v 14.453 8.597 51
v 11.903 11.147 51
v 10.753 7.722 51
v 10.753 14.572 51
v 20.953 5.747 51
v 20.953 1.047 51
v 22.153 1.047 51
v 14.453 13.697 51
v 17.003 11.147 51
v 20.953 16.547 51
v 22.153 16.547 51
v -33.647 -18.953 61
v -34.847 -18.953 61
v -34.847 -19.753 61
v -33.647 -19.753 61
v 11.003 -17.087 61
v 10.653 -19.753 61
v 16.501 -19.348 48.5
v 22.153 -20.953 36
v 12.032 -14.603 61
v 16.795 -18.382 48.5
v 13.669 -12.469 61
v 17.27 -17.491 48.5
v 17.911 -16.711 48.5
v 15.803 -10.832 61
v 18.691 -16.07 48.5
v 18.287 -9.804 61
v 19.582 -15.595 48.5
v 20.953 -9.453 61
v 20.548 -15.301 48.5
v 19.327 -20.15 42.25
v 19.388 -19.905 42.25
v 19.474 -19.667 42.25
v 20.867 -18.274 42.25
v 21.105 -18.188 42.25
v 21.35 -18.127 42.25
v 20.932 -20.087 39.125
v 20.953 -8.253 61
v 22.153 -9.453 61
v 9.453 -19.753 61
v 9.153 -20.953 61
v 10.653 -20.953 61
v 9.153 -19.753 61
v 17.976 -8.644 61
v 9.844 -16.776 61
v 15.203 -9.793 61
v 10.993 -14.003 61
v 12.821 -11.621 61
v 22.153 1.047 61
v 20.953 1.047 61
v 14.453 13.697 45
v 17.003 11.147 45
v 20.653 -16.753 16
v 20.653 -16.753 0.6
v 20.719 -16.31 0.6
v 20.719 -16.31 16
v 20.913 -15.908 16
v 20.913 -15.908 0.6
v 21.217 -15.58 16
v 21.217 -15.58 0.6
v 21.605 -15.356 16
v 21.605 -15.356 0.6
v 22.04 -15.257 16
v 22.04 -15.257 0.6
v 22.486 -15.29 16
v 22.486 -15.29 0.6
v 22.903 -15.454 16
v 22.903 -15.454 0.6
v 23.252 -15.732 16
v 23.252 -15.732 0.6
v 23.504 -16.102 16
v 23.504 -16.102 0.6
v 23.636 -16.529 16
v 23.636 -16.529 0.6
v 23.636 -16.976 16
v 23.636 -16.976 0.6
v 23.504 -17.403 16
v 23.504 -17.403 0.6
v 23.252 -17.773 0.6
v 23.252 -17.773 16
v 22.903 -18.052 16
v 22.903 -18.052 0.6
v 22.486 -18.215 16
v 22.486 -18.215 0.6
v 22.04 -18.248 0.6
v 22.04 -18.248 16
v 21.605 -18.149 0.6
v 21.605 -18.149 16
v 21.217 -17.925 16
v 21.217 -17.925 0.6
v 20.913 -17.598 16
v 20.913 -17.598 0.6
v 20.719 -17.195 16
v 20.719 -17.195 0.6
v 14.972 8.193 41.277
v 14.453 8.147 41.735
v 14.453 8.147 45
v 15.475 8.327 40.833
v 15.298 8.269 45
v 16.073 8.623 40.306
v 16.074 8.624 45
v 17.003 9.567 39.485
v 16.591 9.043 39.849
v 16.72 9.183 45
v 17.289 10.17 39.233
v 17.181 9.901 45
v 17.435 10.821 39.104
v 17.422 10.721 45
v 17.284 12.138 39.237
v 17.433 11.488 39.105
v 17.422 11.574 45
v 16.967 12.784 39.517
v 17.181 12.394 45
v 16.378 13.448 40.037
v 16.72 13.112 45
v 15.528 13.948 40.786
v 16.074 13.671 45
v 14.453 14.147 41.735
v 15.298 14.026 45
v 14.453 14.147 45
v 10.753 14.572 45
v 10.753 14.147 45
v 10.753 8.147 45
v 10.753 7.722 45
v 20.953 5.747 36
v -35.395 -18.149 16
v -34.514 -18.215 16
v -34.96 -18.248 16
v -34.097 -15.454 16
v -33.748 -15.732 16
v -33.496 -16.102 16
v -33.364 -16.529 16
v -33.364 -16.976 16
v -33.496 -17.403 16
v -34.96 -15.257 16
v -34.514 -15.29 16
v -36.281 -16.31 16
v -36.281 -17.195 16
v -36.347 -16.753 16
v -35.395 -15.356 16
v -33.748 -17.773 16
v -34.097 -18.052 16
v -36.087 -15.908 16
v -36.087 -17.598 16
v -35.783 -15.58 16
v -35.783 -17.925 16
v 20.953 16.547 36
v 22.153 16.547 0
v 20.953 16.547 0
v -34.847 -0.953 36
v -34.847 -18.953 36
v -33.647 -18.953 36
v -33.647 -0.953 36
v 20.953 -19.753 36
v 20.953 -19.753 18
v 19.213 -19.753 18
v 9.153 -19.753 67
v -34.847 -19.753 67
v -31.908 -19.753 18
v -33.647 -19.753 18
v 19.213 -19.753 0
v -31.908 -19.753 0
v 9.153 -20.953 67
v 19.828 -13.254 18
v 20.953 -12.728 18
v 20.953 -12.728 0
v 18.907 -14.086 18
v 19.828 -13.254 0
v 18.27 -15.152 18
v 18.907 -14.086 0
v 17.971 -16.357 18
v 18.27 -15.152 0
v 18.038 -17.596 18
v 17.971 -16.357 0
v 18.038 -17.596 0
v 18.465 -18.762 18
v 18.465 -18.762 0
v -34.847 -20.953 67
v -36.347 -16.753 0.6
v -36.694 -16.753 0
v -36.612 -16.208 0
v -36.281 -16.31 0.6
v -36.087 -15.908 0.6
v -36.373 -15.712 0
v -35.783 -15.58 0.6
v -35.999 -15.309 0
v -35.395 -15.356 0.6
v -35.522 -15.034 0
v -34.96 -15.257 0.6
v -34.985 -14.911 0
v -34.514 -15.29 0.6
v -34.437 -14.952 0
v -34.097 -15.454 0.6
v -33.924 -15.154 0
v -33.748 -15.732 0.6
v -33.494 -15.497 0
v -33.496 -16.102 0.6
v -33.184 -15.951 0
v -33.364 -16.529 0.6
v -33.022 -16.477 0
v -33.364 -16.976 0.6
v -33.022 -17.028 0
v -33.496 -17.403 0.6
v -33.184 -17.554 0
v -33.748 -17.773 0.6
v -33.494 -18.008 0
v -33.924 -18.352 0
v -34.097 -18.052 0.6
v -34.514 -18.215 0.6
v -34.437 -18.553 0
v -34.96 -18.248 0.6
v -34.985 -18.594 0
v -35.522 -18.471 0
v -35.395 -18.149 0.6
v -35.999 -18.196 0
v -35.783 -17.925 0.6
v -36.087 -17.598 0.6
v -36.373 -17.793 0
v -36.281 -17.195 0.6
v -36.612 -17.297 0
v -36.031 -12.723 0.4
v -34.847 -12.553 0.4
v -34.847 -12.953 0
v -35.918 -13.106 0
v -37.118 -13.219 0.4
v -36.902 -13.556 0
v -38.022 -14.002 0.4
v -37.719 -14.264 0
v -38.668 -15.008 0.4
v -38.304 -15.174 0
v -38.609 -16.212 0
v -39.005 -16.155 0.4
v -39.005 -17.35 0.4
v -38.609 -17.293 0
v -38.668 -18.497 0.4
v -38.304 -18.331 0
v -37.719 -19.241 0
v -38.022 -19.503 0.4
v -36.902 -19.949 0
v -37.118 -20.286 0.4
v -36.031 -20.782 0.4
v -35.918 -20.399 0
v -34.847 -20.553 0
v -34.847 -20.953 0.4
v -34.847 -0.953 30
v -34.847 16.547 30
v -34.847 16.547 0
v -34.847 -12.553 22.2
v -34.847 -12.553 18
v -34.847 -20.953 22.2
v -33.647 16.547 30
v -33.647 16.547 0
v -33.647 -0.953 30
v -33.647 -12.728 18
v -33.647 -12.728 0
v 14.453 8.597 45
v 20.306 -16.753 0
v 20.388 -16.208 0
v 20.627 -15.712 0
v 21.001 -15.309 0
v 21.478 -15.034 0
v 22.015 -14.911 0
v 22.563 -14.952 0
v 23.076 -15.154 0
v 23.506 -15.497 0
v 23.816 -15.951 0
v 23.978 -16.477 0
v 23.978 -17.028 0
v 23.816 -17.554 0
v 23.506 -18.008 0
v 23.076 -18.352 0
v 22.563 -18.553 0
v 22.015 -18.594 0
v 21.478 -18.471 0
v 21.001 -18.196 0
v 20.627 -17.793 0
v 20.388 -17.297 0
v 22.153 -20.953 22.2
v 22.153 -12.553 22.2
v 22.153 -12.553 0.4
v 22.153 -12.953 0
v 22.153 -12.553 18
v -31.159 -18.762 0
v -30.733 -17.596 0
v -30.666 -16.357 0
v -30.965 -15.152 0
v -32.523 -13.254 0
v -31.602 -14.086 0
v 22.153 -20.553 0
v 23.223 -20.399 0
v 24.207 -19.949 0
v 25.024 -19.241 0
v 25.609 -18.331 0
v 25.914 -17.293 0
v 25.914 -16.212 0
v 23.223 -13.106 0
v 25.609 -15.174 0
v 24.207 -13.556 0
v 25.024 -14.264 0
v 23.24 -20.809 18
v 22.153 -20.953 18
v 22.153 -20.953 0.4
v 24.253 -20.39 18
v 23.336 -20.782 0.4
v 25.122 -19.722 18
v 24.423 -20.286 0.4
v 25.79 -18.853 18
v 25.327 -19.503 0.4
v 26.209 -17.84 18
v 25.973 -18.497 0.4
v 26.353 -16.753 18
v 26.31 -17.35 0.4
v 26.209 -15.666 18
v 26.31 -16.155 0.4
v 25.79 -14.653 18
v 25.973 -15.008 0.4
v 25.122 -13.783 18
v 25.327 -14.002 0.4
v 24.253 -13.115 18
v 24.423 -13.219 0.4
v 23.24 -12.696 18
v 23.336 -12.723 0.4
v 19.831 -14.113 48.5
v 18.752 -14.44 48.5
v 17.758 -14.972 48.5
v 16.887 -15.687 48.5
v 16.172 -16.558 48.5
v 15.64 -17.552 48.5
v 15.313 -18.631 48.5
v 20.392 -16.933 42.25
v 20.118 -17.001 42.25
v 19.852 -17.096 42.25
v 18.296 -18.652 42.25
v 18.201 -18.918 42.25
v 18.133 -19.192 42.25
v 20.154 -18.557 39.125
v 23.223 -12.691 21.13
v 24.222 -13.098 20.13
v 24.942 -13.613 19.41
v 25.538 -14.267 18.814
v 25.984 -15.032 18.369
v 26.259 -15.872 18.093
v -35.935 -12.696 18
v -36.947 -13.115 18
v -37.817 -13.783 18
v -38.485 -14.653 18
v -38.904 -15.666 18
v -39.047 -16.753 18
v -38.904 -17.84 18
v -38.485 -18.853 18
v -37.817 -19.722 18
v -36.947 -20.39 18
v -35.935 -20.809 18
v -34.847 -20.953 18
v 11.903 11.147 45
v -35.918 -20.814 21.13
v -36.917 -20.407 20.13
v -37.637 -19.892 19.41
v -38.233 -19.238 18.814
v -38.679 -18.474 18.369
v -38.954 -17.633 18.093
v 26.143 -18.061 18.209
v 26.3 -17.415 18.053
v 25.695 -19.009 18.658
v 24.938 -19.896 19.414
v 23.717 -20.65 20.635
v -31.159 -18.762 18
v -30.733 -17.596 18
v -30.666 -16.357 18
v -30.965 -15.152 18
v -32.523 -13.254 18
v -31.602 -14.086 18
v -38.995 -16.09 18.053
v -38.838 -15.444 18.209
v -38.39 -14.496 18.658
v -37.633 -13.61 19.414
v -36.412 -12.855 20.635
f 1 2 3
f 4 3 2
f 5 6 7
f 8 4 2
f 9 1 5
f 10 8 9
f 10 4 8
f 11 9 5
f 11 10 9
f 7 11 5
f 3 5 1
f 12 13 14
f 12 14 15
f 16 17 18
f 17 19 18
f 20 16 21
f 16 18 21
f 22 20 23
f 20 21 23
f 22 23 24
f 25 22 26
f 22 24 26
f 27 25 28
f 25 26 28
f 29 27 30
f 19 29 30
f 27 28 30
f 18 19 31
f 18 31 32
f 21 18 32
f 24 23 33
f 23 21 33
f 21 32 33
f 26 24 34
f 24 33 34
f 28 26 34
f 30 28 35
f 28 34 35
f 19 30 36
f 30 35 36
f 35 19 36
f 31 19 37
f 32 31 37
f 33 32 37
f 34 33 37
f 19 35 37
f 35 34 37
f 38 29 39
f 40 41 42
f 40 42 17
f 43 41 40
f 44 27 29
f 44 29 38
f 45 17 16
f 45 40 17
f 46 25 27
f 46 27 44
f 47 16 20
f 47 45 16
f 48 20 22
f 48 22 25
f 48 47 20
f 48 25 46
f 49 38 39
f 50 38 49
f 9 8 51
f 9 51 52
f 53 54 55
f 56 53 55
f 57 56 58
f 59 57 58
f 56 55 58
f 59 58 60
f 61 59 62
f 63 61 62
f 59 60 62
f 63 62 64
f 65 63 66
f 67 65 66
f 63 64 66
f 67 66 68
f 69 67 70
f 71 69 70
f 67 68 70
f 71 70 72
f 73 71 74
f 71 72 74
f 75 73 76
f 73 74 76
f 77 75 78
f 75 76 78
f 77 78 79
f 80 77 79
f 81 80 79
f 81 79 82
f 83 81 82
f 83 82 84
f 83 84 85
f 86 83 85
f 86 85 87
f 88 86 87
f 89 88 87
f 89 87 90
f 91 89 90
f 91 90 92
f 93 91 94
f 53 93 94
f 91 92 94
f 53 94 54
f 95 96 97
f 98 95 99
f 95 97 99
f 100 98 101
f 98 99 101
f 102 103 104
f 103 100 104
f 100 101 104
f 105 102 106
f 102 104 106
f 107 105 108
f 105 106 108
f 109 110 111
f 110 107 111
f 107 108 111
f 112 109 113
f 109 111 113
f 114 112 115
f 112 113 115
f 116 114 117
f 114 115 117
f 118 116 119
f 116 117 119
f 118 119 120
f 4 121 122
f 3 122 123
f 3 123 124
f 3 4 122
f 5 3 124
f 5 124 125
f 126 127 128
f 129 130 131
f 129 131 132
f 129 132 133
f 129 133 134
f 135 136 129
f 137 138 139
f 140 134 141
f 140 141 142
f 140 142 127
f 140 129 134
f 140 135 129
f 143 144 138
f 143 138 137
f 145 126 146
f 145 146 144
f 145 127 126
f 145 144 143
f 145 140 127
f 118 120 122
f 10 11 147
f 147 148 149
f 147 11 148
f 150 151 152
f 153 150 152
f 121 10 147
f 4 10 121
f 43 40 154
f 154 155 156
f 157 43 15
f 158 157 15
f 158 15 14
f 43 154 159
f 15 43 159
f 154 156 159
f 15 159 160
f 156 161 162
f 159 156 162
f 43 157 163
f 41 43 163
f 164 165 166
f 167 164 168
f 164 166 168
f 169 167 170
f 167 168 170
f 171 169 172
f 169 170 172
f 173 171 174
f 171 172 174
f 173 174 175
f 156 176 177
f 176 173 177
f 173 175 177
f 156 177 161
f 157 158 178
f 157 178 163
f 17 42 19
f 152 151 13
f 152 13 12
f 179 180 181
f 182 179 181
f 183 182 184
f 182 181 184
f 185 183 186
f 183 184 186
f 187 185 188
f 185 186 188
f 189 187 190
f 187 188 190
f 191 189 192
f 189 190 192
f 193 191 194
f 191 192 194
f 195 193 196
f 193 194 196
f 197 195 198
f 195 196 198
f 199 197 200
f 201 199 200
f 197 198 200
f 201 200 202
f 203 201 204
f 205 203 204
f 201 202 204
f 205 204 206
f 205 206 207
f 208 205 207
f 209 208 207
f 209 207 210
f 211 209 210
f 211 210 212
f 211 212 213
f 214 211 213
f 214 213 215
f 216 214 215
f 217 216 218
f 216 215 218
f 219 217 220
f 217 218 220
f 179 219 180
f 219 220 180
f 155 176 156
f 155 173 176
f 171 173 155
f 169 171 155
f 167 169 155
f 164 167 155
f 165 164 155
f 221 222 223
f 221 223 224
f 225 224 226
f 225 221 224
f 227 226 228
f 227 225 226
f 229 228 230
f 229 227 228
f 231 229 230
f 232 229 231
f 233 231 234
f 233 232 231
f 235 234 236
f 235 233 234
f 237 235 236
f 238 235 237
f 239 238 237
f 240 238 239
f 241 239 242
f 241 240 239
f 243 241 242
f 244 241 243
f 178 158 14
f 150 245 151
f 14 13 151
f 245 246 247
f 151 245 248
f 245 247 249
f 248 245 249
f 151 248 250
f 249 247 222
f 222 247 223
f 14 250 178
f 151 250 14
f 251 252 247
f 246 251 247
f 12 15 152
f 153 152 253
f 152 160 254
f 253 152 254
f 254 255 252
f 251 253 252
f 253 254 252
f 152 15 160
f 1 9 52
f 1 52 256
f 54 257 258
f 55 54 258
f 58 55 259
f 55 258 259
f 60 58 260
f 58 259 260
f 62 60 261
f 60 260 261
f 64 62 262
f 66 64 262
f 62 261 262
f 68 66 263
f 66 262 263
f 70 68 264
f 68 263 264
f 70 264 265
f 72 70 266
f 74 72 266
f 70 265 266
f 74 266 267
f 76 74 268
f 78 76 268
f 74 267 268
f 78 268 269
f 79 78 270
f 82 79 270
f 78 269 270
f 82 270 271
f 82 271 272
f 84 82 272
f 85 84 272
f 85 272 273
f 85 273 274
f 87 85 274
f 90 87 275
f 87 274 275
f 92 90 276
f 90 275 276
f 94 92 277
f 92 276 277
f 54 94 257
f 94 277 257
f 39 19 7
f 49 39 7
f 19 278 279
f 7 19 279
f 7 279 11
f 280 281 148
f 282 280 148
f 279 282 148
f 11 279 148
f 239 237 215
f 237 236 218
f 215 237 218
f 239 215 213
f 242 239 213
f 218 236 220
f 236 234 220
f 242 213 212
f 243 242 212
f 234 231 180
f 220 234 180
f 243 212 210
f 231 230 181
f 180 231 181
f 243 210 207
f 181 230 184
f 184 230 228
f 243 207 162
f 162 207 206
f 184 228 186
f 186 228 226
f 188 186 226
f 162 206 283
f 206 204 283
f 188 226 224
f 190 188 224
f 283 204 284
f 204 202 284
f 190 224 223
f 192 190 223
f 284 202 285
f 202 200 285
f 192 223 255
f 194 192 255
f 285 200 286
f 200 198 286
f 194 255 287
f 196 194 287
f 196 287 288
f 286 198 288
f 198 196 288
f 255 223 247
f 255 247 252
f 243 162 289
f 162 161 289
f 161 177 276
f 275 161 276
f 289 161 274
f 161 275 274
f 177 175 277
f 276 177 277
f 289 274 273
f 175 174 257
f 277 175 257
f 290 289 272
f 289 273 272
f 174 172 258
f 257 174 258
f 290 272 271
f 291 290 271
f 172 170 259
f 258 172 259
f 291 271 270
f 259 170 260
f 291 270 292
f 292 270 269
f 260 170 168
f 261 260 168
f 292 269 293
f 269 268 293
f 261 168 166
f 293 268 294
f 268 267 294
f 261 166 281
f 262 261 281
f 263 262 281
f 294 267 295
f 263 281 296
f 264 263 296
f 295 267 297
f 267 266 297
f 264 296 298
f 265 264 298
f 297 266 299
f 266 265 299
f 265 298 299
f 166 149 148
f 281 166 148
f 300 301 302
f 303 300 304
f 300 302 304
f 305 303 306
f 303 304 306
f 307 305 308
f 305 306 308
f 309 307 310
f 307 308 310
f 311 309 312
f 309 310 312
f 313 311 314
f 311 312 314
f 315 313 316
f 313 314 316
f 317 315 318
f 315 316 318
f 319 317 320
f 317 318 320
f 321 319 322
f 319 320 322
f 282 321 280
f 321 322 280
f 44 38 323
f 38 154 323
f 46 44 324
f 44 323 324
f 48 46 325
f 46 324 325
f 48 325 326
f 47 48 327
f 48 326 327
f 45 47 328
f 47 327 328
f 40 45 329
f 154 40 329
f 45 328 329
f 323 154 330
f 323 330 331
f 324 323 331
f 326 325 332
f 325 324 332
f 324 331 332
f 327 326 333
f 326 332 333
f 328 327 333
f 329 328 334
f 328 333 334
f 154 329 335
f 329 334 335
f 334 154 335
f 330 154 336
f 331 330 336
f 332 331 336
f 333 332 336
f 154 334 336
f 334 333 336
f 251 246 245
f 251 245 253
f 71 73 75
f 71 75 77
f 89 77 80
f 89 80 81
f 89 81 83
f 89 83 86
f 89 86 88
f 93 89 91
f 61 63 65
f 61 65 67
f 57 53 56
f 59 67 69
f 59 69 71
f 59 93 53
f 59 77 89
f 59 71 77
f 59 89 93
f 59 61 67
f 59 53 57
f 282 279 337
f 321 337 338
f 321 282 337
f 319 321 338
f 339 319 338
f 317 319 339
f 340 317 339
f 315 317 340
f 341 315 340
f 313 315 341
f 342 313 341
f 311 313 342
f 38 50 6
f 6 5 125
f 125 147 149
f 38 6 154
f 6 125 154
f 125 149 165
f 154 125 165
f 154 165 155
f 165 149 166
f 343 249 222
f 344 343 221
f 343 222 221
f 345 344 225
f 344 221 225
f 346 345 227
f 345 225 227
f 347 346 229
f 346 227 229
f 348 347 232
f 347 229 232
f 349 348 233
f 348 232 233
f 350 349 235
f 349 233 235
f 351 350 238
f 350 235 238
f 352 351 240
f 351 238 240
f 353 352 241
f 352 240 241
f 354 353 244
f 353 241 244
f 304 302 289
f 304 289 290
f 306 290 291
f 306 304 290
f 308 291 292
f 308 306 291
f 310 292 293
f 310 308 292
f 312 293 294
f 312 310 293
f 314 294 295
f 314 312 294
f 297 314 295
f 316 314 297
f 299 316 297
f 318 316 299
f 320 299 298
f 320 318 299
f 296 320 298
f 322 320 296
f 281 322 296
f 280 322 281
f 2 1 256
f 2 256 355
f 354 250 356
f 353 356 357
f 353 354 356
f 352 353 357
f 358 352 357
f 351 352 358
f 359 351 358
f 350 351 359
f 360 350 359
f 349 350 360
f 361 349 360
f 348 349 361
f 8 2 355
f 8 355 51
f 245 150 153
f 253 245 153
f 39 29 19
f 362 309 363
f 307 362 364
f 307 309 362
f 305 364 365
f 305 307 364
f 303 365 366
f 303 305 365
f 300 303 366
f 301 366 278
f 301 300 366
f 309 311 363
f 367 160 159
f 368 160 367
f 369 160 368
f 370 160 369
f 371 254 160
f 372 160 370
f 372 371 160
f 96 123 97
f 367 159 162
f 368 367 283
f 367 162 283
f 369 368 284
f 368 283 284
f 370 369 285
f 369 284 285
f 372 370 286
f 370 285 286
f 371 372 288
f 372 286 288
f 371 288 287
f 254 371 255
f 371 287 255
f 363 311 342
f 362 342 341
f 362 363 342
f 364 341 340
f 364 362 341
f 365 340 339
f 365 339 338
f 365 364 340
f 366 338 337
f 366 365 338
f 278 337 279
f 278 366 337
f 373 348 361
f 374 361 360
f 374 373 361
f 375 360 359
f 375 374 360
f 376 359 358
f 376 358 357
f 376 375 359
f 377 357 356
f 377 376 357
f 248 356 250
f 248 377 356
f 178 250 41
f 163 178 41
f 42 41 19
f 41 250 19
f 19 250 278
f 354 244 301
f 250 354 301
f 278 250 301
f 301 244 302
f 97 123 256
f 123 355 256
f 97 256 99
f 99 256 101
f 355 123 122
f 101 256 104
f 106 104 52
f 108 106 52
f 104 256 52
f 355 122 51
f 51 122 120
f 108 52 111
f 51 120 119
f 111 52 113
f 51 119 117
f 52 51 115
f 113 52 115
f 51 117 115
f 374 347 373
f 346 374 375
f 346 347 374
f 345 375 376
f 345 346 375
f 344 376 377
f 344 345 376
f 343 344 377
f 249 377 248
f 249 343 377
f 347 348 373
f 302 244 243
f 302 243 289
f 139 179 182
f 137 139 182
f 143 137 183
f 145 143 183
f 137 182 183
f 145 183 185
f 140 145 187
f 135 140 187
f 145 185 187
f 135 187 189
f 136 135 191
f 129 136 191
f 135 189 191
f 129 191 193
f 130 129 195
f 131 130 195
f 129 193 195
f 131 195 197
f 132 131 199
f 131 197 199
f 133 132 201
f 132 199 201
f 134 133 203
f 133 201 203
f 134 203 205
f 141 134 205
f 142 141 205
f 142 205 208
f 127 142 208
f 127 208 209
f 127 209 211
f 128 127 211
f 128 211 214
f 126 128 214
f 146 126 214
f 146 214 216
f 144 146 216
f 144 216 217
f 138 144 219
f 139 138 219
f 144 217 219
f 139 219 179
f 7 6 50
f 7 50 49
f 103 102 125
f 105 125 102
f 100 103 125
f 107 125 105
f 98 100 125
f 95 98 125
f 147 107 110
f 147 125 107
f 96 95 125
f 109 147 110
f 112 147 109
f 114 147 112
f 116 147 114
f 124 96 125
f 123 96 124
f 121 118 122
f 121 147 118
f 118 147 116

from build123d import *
from OCP.BRepFilletAPI import BRepFilletAPI_MakeChamfer

# Parameters (mm, degrees)
BOSS_EXTRUDE1_DEPTH            = 67
CUT_EXTRUDE1_DEPTH             = 6
CUT_EXTRUDE2_DEPTH             = 10
CUT_EXTRUDE2_DEPTH_BACK        = 10
SKETCH3_W                      = 57
SKETCH3_H                      = 15.5
SKETCH4_W                      = 1.200010082
SKETCH4_H                      = 17.5
CUT_EXTRUDE3_DEPTH             = 21
SKETCH6_R                      = 1.5
CUT_EXTRUDE4_DEPTH             = 16
SKETCH7_W                      = 9.665590287
SKETCH7_H                      = 8.4
SKETCH7_W_2                    = 5.868264521
SKETCH7_H_2                    = 7.024922359
SKETCH7_W_3                    = 9.177584355
SKETCH7_H_3                    = 13.349294629
SKETCH7_W_4                    = 6.831514048
SKETCH7_H_4                    = 12.149294629
CUT_EXTRUDE5_DEPTH             = 43
CHAMFER1_SIZE                  = 4.2
CHAMFER3_SIZE                  = 0.6
CHAMFER3_SIZE2                 = 0.346410162
CHAMFER4_SIZE                  = 0.4
BOSS_EXTRUDE2_DEPTH            = 15
CUT_EXTRUDE6_DEPTH             = 10
CUT_EXTRUDE6_DEPTH_BACK        = 9
CUT_EXTRUDE7_REACH             = 88.139
CUT_EXTRUDE7_DIRECTION_2_DEPTH = 10
SKETCH12_W                     = 1.2
SKETCH12_H                     = 25
CUT_EXTRUDE8_DEPTH             = 20


with BuildPart() as part:
    # Sketch1 → Boss-Extrude1 (new body)
    with BuildSketch(Plane.XY):
        with BuildLine():
            Line((-33.64746859, 16.547458508), (-34.84746859, 16.547458508))
            Line((-34.84746859, 16.547458508), (-34.84746859, -12.552541492))
            ThreePointArc((-34.84746859, -12.552541492), (-39.04746859, -16.752541492), (-34.84746859, -20.952541492))
            Line((-34.84746859, -20.952541492), (22.15253141, -20.952541492))
            ThreePointArc((22.15253141, -20.952541492), (26.35253141, -16.752541492), (22.15253141, -12.552541492))
            Line((22.15253141, -12.552541492), (22.15253141, 16.547458508))
            Line((22.15253141, 16.547458508), (20.95253141, 16.547458508))
            Line((20.95253141, 16.547458508), (20.95253141, -12.727619133))
            ThreePointArc((20.95253141, -12.727619133), (18.075643363, -15.743094195), (19.213143719, -19.752541492))
            Line((19.213143719, -19.752541492), (-31.908080898, -19.752541492))
            ThreePointArc((-31.908080898, -19.752541492), (-30.770580542, -15.743094195), (-33.64746859, -12.727619133))
            Line((-33.64746859, -12.727619133), (-33.64746859, 16.547458508))
        make_face()
    extrude(amount=BOSS_EXTRUDE1_DEPTH)

    # Sketch2 → Cut-Extrude1 (cut)
    with BuildSketch(Plane.XY.offset(67)):
        Polygon((9.15253141, -20.952541492), (32.878117539, -20.952541492), (32.878117539, 12.674112742), (-34.84746859, 12.674112742), (-34.84746859, -7.507472589), (-42.7406396, -7.507472589), (-42.7406396, -20.952541492), (-34.84746859, -20.952541492), (-34.84746859, -19.752541492), (9.15253141, -19.752541492), align=None)
    extrude(amount=-CUT_EXTRUDE1_DEPTH, mode=Mode.SUBTRACT)

    # Sketch3 → Cut-Extrude2 (cut, two sides: drawn at the far end of the back side and taken through both)
    with BuildSketch(Plane.XY.offset(61).offset(-CUT_EXTRUDE2_DEPTH_BACK)):
        with Locations((-6.34746859, 8.797458508)):
            Rectangle(SKETCH3_W, SKETCH3_H)
    extrude(amount=CUT_EXTRUDE2_DEPTH + CUT_EXTRUDE2_DEPTH_BACK, mode=Mode.SUBTRACT)

    # Sketch4 → Cut-Extrude3 (cut)
    with BuildSketch(Plane.XY.offset(51)):
        with Locations((-34.247463549, 7.797458508)):
            Rectangle(SKETCH4_W, SKETCH4_H)
    extrude(amount=-CUT_EXTRUDE3_DEPTH, mode=Mode.SUBTRACT)

    # Sketch6 → Cut-Extrude4 (cut)
    with BuildSketch(Plane(origin=(0, 0, 0), x_dir=(-1, 0, 0), z_dir=(0, 0, -1))):
        with Locations((-22.15253141, -16.752541492)):
            Circle(SKETCH6_R)
        with Locations((34.84746859, -16.752541492)):
            Circle(SKETCH6_R)
    extrude(amount=-CUT_EXTRUDE4_DEPTH, mode=Mode.SUBTRACT)

    # Sketch7 → Cut-Extrude5 (cut)
    with BuildSketch(Plane.XY.offset(61)):
        with Locations((26.985326554, -16.752541492)):
            Rectangle(SKETCH7_W, SKETCH7_H)
        with Locations((18.01839915, -16.240080313)):
            Rectangle(SKETCH7_W_2, SKETCH7_H_2)
        with Locations((-39.436260768, -14.277894178)):
            Rectangle(SKETCH7_W_3, SKETCH7_H_3)
        with Locations((-30.231711566, -13.677894178)):
            Rectangle(SKETCH7_W_4, SKETCH7_H_4)
    extrude(amount=-CUT_EXTRUDE5_DEPTH, mode=Mode.SUBTRACT)

    # Chamfer1
    # the kernel refuses this chamfer: 4.2 mm, written as the material it adds along each edge
    with BuildSketch(Plane(origin=(22.15253141, -31.753610042, 18), x_dir=(0.9996219169112966, 0, -0.02749587661058613), z_dir=(0, 1, 0))) as chamfer1_piece_1_section:
        Polygon((CHAMFER1_SIZE * 0.999621916911, -CHAMFER1_SIZE * 0.0274958766106), (-CHAMFER1_SIZE * 0.0274958766106, -CHAMFER1_SIZE * 0.999621916911), (0, 0), align=None)
    chamfer1_piece_1 = extrude(amount=30.002137099, mode=Mode.PRIVATE)
    chamfer1_piece_1 = chamfer1_piece_1 & Plane(origin=(22.15253141, -16.752541492, 19.463662148), x_dir=(0, -1, 0), z_dir=(0, 0, -1)) * Cylinder(4.2, 77, mode=Mode.PRIVATE)
    add(chamfer1_piece_1)
    with BuildSketch(Plane(origin=(-34.84746859, -1.751472943, 18), x_dir=(-0.9996219169112966, 0, -0.02749587661058611), z_dir=(0, -1, 0))) as chamfer1_piece_2_section:
        Polygon((CHAMFER1_SIZE * 0.999621916911, -CHAMFER1_SIZE * 0.0274958766106), (-CHAMFER1_SIZE * 0.0274958766106, -CHAMFER1_SIZE * 0.999621916911), (0, 0), align=None)
    chamfer1_piece_2 = extrude(amount=30.002137099, mode=Mode.PRIVATE)
    chamfer1_piece_2 = chamfer1_piece_2 & Plane(origin=(-34.84746859, -16.752541492, 19.463662148), x_dir=(0, 1, 0), z_dir=(0, 0, -1)) * Cylinder(4.2, 77, mode=Mode.PRIVATE)
    add(chamfer1_piece_2)

    # Chamfer3: one chamfer whose edges measure the first distance from different faces: ONE call of the kernel's chamfer builder (chamfer() names one face for all edges)
    chamfer3_edges_1 = [part.edges().sort_by_distance(p)[0] for p in [
        (23.65253141, -16.752541492, 0),
    ]]
    chamfer3_side_1 = [part.faces().sort_by_distance(p)[0] for p in [
        (23.65253141, -16.752541492, 8),
    ]]
    chamfer3_edges_2 = [part.edges().sort_by_distance(p)[0] for p in [
        (-33.34746859, -16.752541492, 0),
    ]]
    chamfer3_side_2 = [part.faces().sort_by_distance(p)[0] for p in [
        (-33.34746859, -16.752541492, 8),
    ]]
    chamfer3 = BRepFilletAPI_MakeChamfer(part.part.solid().wrapped)
    for e in chamfer3_edges_1:
        chamfer3.Add(CHAMFER3_SIZE, CHAMFER3_SIZE2, e.wrapped, chamfer3_side_1[0].wrapped)  # the first distance lies on this face
    for e in chamfer3_edges_2:
        chamfer3.Add(CHAMFER3_SIZE, CHAMFER3_SIZE2, e.wrapped, chamfer3_side_2[0].wrapped)  # the first distance lies on this face
    add(Compound.cast(chamfer3.Shape()), mode=Mode.REPLACE)

    # Chamfer4
    chamfer4_edges = [part.edges().sort_by_distance(p)[0] for p in [
        (26.35253141, -16.752541492, 0),
        (-6.34746859, -20.952541492, 0),
        (-39.04746859, -16.752541492, 0),
    ]]
    chamfer(chamfer4_edges, length=CHAMFER4_SIZE)

    # Sketch8 → Boss-Extrude2 (add)
    with BuildSketch(Plane.XY.offset(51)):
        Polygon((10.75253141, 14.572458508), (10.75253141, 12.747458508), (10.75253141, 9.547458508), (10.75253141, 7.722458508), (20.95253141, 5.747458508), (22.15253141, 5.747458508), (22.15253141, 16.547458508), (20.95253141, 16.547458508), align=None)
        Polygon((11.90253141, 11.147458508), (14.45253141, 13.697458508), (17.00253141, 11.147458508), (14.45253141, 8.597458508), align=None, mode=Mode.SUBTRACT)
    extrude(amount=-BOSS_EXTRUDE2_DEPTH)

    # Sketch10 → Cut-Extrude6 (cut, two sides: drawn at the far end of the back side and taken through both)
    with BuildSketch(Plane(origin=(0, 0, 36), x_dir=(-1, 0, 0), z_dir=(0, 0, -1)).offset(-CUT_EXTRUDE6_DEPTH_BACK)):
        with BuildLine():
            Line((-14.45253141, 14.147458508), (-10.75253141, 14.147458508))
            Line((-10.75253141, 14.147458508), (-10.75253141, 8.147458508))
            Line((-10.75253141, 8.147458508), (-14.45253141, 8.147458508))
            ThreePointArc((-14.45253141, 8.147458508), (-17.45253141, 11.147458508), (-14.45253141, 14.147458508))
        make_face()
    extrude(amount=CUT_EXTRUDE6_DEPTH + CUT_EXTRUDE6_DEPTH_BACK, mode=Mode.SUBTRACT)

    # Cut-Extrude7: up to this plane
    cut_extrude7_end = Plane(origin=(20.95253141, 5.747458508, 36), z_dir=(-0.19009672538975653, -0.9817653665698803, 0))
    # Sketch11 → Cut-Extrude7 (cut, up to the surface)
    with BuildSketch(Plane(origin=(0, 16.547458508, 0), x_dir=(1, 0, 0), z_dir=(0, 1, 0)), mode=Mode.PRIVATE) as cut_extrude7_sk1:
        Polygon((20.95253141, -36), (10.75253141, -45), (10.75253141, -36), align=None)
    cut_extrude7_tool1 = split(extrude(cut_extrude7_sk1.sketch, amount=-CUT_EXTRUDE7_REACH, mode=Mode.PRIVATE), bisect_by=cut_extrude7_end, keep=Keep.BOTH, mode=Mode.PRIVATE)
    add(cut_extrude7_tool1.solids().sort_by_distance((14.152531, 16.547459, 39))[0], mode=Mode.SUBTRACT)

    # Sketch11 → Cut-Extrude7 direction 2 (cut)
    with BuildSketch(Plane(origin=(0, 16.547458508, 0), x_dir=(1, 0, 0), z_dir=(0, 1, 0))):
        Polygon((20.95253141, -36), (10.75253141, -45), (10.75253141, -36), align=None)
    extrude(amount=CUT_EXTRUDE7_DIRECTION_2_DEPTH, mode=Mode.SUBTRACT)

    # Sketch12 → Cut-Extrude8 (cut)
    with BuildSketch(Plane(origin=(0, 1.047458508, 0), x_dir=(1, 0, 0), z_dir=(0, 1, 0))):
        with Locations((-34.24746859, -48.5)):
            Rectangle(SKETCH12_W, SKETCH12_H)
    extrude(amount=-CUT_EXTRUDE8_DEPTH, mode=Mode.SUBTRACT)

    # Sketch13 → Loft1 section 0
    with BuildSketch(Plane.XY.offset(61), mode=Mode.PRIVATE) as loft1_s0:
        with BuildLine():
            Line((9.45253141, -19.752541492), (20.95253141, -19.752541492))
            Line((20.95253141, -19.752541492), (20.95253141, -8.252541492))
            ThreePointArc((20.95253141, -8.252541492), (12.820803427, -11.620813508), (9.45253141, -19.752541492))
        make_face()
    loft([loft1_s0.sketch, Vertex(20.95253141, -19.752541492, 36)])

    # Sketch15 → Cut-Loft1 section 0
    with BuildSketch(Plane.XY.offset(61), mode=Mode.PRIVATE) as cut_loft1_s0:
        with BuildLine():
            Line((20.95253141, -9.452541492), (22.15253141, -9.452541492))
            Line((22.15253141, -9.452541492), (22.15253141, -20.952541492))
            Line((22.15253141, -20.952541492), (10.65253141, -20.952541492))
            Line((10.65253141, -20.952541492), (10.65253141, -19.752541492))
            ThreePointArc((10.65253141, -19.752541492), (13.669331564, -12.469341646), (20.95253141, -9.452541492))
        make_face()
    loft([cut_loft1_s0.sketch, Vertex(22.15253141, -20.952541492, 36)], mode=Mode.SUBTRACT)


solid = part.part
